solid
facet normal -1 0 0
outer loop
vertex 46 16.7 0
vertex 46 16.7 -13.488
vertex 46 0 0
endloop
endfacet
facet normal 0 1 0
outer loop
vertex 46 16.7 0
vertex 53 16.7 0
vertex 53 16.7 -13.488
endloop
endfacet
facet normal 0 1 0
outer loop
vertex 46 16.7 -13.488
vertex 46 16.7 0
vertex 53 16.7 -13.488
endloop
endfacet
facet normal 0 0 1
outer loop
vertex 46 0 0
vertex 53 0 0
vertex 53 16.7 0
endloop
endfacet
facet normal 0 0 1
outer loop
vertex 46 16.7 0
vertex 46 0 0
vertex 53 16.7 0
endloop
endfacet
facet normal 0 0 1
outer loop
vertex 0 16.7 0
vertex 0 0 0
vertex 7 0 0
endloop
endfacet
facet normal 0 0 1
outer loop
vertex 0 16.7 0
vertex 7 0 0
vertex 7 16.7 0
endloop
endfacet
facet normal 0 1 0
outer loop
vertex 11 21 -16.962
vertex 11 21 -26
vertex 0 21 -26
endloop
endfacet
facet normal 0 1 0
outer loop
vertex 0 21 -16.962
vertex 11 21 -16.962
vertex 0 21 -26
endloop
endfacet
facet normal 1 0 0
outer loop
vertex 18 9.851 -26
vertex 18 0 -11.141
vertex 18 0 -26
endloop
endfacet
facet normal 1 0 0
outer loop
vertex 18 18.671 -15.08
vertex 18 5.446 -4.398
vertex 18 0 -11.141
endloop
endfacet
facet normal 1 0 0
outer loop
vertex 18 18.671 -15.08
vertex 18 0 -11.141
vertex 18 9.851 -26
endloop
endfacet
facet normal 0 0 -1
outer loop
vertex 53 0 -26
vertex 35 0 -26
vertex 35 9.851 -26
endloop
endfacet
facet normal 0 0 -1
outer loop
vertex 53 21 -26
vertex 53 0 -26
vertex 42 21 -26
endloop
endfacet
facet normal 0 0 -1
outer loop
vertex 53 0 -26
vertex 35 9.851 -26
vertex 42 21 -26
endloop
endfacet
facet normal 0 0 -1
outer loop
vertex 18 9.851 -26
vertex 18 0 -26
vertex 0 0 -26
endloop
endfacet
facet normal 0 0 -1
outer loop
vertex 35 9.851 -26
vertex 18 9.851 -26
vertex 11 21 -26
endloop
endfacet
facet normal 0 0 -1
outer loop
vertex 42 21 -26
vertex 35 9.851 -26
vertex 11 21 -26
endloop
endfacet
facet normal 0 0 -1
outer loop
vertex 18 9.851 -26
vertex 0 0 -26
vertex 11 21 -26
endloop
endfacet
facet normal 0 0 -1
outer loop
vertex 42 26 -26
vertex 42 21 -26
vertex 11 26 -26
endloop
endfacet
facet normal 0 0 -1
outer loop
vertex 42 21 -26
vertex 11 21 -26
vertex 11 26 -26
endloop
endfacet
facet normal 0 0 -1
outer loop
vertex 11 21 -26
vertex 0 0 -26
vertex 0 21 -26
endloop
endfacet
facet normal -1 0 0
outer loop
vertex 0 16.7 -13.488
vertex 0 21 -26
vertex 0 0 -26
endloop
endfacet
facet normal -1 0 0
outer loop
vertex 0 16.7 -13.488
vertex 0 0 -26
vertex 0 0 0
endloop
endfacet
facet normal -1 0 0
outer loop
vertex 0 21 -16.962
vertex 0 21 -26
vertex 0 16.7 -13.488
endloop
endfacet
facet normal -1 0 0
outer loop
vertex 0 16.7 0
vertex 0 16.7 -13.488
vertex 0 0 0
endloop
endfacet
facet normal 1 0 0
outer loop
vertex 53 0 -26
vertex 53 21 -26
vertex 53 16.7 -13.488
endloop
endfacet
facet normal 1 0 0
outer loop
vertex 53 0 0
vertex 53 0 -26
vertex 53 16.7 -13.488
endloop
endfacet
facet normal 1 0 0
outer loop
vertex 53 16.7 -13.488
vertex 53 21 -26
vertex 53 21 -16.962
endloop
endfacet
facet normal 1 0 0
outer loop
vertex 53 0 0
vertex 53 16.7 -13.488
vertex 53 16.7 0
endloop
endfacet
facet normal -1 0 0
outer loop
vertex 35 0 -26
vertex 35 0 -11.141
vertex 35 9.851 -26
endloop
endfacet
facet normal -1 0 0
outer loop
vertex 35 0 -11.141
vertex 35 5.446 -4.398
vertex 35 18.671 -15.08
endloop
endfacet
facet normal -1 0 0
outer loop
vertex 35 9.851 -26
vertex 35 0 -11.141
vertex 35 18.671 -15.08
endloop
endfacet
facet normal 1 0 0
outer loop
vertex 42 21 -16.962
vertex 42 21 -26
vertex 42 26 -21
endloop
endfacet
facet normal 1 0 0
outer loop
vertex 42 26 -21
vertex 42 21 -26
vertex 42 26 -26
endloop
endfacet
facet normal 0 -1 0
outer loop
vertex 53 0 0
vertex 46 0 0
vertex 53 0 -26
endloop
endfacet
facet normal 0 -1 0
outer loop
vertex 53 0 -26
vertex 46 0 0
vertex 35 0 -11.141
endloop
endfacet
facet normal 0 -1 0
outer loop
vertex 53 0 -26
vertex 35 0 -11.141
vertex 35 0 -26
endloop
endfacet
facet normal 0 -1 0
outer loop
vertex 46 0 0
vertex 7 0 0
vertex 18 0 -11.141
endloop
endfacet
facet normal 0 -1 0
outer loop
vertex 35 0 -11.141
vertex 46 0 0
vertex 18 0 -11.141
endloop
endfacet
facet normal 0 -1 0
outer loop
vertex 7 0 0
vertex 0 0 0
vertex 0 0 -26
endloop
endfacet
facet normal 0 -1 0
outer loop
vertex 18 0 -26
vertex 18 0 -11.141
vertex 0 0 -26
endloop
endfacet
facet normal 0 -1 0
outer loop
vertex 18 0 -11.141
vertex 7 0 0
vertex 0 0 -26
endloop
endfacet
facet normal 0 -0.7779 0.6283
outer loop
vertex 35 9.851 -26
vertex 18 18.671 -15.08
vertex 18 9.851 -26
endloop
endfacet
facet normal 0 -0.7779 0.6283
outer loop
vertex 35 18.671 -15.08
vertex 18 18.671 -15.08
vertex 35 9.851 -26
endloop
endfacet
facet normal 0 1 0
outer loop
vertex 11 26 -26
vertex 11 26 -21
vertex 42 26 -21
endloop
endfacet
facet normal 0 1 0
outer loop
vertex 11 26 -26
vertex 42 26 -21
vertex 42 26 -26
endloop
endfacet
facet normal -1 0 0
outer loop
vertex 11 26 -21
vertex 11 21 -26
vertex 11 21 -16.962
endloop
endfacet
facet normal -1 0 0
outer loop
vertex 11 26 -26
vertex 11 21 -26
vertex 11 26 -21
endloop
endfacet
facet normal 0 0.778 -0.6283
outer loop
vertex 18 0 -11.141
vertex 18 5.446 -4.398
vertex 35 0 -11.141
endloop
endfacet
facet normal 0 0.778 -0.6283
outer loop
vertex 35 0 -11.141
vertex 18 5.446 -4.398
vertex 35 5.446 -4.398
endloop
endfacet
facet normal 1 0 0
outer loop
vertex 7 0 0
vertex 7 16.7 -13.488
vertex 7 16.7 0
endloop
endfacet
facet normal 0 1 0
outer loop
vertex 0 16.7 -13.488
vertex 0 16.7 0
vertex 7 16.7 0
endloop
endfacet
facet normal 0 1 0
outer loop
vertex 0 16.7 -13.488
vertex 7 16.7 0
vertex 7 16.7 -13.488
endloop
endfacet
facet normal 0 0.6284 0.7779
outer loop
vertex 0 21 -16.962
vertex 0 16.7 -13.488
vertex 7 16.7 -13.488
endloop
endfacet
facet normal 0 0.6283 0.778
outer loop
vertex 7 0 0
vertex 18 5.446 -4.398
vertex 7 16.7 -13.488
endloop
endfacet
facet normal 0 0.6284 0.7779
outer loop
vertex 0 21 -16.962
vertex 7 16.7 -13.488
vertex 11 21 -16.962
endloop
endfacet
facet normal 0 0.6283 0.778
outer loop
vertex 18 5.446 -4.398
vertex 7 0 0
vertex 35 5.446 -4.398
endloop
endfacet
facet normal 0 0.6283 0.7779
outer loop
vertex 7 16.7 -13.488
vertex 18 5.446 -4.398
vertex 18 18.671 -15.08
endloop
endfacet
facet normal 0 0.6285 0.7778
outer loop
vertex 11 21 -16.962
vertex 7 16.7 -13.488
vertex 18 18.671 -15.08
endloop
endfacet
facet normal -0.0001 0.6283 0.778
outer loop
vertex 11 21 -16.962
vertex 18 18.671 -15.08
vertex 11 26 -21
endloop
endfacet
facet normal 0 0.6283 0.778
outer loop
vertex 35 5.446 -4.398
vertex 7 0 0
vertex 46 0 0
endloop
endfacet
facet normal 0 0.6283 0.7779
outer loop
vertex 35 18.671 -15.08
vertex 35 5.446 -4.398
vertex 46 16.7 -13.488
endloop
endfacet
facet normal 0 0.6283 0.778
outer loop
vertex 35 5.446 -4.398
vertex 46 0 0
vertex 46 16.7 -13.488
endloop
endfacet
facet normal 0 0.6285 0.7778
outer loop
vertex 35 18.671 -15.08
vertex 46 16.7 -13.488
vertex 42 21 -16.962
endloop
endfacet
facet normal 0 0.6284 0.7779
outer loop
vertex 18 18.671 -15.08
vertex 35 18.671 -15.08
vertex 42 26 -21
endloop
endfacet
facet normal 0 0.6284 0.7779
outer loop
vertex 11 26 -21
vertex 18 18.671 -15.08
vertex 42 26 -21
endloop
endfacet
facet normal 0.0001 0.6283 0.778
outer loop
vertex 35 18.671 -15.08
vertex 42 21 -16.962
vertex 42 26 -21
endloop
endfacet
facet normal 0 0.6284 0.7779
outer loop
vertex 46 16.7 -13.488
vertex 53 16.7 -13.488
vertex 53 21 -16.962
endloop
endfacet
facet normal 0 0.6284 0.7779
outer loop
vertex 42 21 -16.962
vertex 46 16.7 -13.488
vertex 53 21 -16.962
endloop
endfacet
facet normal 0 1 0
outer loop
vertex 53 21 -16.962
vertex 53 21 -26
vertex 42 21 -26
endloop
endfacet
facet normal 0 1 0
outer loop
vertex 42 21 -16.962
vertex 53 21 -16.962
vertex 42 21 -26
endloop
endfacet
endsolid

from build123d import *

# Parameters (mm, degrees)
SKETCH2_W               = 26
SKETCH2_H               = 26
BOSS_EXTRUDE1_DEPTH     = 53
CUT_EXTRUDE2_DEPTH      = 1
CUT_EXTRUDE2_DEPTH_BACK = 54
SKETCH4_W               = 11
SKETCH4_H               = 5
CUT_EXTRUDE3_DEPTH      = 27
SKETCH5_W               = 17
SKETCH5_H               = 17
CUT_EXTRUDE4_DEPTH      = 21.226470685
BOSS_EXTRUDE3_DEPTH     = 7
BOSS_EXTRUDE4_DEPTH     = 7


with BuildPart() as part:
    # Sketch2 → Boss-Extrude1 (new body)
    with BuildSketch(Plane(origin=(0, 0, 0), x_dir=(0, 0, -1), z_dir=(1, 0, 0))):
        with Locations((13, 13)):
            Rectangle(SKETCH2_W, SKETCH2_H)
    extrude(amount=BOSS_EXTRUDE1_DEPTH)

    # Sketch3 → Cut-Extrude2 (cut, two sides)
    with BuildSketch(Plane(origin=(53, 0, 0), x_dir=(0, 0, -1), z_dir=(1, 0, 0))) as cut_extrude2_sk:
        Polygon((-52.490719717, -64.988510126), (0, 0), (21, 26), (73.490719717, 90.988510126), (-56.486300535, 195.969949561), (-182.46773997, 39.992929308), align=None)
    extrude(amount=CUT_EXTRUDE2_DEPTH, mode=Mode.SUBTRACT)
    extrude(cut_extrude2_sk.sketch, amount=-CUT_EXTRUDE2_DEPTH_BACK, mode=Mode.SUBTRACT)

    # Sketch4 → Cut-Extrude3 (cut, through all)
    with BuildSketch(Plane(origin=(0, 0, -26), x_dir=(-1, 0, 0), z_dir=(0, 0, -1))):
        with Locations((-5.5, 23.5)):
            Rectangle(SKETCH4_W, SKETCH4_H)
        with Locations((-47.5, 23.5)):
            Rectangle(SKETCH4_W, SKETCH4_H)
    extrude(amount=-CUT_EXTRUDE3_DEPTH, mode=Mode.SUBTRACT)

    # Sketch5 → Cut-Extrude4 (cut, through all)
    with BuildSketch(Plane(origin=(0, 0, 0), x_dir=(1, 0, 0), z_dir=(0, 0.628337107, 0.77794118))):
        with Locations((26.5, 15.5)):
            Rectangle(SKETCH5_W, SKETCH5_H)
    extrude(amount=-CUT_EXTRUDE4_DEPTH, mode=Mode.SUBTRACT)

    # Sketch6 → Boss-Extrude3 (add)
    with BuildSketch(Plane(origin=(53, 0, 0), x_dir=(0, 0, -1), z_dir=(1, 0, 0))):
        Polygon((0, 0), (0, 16.7), (13.488461538, 16.7), align=None)
    extrude(amount=-BOSS_EXTRUDE3_DEPTH)

    # Sketch8 → Boss-Extrude4 (add)
    with BuildSketch(Plane.ZY):
        Polygon((0, 0), (0, 16.7), (-13.488461538, 16.7), align=None)
    extrude(amount=-BOSS_EXTRUDE4_DEPTH)


solid = part.part
